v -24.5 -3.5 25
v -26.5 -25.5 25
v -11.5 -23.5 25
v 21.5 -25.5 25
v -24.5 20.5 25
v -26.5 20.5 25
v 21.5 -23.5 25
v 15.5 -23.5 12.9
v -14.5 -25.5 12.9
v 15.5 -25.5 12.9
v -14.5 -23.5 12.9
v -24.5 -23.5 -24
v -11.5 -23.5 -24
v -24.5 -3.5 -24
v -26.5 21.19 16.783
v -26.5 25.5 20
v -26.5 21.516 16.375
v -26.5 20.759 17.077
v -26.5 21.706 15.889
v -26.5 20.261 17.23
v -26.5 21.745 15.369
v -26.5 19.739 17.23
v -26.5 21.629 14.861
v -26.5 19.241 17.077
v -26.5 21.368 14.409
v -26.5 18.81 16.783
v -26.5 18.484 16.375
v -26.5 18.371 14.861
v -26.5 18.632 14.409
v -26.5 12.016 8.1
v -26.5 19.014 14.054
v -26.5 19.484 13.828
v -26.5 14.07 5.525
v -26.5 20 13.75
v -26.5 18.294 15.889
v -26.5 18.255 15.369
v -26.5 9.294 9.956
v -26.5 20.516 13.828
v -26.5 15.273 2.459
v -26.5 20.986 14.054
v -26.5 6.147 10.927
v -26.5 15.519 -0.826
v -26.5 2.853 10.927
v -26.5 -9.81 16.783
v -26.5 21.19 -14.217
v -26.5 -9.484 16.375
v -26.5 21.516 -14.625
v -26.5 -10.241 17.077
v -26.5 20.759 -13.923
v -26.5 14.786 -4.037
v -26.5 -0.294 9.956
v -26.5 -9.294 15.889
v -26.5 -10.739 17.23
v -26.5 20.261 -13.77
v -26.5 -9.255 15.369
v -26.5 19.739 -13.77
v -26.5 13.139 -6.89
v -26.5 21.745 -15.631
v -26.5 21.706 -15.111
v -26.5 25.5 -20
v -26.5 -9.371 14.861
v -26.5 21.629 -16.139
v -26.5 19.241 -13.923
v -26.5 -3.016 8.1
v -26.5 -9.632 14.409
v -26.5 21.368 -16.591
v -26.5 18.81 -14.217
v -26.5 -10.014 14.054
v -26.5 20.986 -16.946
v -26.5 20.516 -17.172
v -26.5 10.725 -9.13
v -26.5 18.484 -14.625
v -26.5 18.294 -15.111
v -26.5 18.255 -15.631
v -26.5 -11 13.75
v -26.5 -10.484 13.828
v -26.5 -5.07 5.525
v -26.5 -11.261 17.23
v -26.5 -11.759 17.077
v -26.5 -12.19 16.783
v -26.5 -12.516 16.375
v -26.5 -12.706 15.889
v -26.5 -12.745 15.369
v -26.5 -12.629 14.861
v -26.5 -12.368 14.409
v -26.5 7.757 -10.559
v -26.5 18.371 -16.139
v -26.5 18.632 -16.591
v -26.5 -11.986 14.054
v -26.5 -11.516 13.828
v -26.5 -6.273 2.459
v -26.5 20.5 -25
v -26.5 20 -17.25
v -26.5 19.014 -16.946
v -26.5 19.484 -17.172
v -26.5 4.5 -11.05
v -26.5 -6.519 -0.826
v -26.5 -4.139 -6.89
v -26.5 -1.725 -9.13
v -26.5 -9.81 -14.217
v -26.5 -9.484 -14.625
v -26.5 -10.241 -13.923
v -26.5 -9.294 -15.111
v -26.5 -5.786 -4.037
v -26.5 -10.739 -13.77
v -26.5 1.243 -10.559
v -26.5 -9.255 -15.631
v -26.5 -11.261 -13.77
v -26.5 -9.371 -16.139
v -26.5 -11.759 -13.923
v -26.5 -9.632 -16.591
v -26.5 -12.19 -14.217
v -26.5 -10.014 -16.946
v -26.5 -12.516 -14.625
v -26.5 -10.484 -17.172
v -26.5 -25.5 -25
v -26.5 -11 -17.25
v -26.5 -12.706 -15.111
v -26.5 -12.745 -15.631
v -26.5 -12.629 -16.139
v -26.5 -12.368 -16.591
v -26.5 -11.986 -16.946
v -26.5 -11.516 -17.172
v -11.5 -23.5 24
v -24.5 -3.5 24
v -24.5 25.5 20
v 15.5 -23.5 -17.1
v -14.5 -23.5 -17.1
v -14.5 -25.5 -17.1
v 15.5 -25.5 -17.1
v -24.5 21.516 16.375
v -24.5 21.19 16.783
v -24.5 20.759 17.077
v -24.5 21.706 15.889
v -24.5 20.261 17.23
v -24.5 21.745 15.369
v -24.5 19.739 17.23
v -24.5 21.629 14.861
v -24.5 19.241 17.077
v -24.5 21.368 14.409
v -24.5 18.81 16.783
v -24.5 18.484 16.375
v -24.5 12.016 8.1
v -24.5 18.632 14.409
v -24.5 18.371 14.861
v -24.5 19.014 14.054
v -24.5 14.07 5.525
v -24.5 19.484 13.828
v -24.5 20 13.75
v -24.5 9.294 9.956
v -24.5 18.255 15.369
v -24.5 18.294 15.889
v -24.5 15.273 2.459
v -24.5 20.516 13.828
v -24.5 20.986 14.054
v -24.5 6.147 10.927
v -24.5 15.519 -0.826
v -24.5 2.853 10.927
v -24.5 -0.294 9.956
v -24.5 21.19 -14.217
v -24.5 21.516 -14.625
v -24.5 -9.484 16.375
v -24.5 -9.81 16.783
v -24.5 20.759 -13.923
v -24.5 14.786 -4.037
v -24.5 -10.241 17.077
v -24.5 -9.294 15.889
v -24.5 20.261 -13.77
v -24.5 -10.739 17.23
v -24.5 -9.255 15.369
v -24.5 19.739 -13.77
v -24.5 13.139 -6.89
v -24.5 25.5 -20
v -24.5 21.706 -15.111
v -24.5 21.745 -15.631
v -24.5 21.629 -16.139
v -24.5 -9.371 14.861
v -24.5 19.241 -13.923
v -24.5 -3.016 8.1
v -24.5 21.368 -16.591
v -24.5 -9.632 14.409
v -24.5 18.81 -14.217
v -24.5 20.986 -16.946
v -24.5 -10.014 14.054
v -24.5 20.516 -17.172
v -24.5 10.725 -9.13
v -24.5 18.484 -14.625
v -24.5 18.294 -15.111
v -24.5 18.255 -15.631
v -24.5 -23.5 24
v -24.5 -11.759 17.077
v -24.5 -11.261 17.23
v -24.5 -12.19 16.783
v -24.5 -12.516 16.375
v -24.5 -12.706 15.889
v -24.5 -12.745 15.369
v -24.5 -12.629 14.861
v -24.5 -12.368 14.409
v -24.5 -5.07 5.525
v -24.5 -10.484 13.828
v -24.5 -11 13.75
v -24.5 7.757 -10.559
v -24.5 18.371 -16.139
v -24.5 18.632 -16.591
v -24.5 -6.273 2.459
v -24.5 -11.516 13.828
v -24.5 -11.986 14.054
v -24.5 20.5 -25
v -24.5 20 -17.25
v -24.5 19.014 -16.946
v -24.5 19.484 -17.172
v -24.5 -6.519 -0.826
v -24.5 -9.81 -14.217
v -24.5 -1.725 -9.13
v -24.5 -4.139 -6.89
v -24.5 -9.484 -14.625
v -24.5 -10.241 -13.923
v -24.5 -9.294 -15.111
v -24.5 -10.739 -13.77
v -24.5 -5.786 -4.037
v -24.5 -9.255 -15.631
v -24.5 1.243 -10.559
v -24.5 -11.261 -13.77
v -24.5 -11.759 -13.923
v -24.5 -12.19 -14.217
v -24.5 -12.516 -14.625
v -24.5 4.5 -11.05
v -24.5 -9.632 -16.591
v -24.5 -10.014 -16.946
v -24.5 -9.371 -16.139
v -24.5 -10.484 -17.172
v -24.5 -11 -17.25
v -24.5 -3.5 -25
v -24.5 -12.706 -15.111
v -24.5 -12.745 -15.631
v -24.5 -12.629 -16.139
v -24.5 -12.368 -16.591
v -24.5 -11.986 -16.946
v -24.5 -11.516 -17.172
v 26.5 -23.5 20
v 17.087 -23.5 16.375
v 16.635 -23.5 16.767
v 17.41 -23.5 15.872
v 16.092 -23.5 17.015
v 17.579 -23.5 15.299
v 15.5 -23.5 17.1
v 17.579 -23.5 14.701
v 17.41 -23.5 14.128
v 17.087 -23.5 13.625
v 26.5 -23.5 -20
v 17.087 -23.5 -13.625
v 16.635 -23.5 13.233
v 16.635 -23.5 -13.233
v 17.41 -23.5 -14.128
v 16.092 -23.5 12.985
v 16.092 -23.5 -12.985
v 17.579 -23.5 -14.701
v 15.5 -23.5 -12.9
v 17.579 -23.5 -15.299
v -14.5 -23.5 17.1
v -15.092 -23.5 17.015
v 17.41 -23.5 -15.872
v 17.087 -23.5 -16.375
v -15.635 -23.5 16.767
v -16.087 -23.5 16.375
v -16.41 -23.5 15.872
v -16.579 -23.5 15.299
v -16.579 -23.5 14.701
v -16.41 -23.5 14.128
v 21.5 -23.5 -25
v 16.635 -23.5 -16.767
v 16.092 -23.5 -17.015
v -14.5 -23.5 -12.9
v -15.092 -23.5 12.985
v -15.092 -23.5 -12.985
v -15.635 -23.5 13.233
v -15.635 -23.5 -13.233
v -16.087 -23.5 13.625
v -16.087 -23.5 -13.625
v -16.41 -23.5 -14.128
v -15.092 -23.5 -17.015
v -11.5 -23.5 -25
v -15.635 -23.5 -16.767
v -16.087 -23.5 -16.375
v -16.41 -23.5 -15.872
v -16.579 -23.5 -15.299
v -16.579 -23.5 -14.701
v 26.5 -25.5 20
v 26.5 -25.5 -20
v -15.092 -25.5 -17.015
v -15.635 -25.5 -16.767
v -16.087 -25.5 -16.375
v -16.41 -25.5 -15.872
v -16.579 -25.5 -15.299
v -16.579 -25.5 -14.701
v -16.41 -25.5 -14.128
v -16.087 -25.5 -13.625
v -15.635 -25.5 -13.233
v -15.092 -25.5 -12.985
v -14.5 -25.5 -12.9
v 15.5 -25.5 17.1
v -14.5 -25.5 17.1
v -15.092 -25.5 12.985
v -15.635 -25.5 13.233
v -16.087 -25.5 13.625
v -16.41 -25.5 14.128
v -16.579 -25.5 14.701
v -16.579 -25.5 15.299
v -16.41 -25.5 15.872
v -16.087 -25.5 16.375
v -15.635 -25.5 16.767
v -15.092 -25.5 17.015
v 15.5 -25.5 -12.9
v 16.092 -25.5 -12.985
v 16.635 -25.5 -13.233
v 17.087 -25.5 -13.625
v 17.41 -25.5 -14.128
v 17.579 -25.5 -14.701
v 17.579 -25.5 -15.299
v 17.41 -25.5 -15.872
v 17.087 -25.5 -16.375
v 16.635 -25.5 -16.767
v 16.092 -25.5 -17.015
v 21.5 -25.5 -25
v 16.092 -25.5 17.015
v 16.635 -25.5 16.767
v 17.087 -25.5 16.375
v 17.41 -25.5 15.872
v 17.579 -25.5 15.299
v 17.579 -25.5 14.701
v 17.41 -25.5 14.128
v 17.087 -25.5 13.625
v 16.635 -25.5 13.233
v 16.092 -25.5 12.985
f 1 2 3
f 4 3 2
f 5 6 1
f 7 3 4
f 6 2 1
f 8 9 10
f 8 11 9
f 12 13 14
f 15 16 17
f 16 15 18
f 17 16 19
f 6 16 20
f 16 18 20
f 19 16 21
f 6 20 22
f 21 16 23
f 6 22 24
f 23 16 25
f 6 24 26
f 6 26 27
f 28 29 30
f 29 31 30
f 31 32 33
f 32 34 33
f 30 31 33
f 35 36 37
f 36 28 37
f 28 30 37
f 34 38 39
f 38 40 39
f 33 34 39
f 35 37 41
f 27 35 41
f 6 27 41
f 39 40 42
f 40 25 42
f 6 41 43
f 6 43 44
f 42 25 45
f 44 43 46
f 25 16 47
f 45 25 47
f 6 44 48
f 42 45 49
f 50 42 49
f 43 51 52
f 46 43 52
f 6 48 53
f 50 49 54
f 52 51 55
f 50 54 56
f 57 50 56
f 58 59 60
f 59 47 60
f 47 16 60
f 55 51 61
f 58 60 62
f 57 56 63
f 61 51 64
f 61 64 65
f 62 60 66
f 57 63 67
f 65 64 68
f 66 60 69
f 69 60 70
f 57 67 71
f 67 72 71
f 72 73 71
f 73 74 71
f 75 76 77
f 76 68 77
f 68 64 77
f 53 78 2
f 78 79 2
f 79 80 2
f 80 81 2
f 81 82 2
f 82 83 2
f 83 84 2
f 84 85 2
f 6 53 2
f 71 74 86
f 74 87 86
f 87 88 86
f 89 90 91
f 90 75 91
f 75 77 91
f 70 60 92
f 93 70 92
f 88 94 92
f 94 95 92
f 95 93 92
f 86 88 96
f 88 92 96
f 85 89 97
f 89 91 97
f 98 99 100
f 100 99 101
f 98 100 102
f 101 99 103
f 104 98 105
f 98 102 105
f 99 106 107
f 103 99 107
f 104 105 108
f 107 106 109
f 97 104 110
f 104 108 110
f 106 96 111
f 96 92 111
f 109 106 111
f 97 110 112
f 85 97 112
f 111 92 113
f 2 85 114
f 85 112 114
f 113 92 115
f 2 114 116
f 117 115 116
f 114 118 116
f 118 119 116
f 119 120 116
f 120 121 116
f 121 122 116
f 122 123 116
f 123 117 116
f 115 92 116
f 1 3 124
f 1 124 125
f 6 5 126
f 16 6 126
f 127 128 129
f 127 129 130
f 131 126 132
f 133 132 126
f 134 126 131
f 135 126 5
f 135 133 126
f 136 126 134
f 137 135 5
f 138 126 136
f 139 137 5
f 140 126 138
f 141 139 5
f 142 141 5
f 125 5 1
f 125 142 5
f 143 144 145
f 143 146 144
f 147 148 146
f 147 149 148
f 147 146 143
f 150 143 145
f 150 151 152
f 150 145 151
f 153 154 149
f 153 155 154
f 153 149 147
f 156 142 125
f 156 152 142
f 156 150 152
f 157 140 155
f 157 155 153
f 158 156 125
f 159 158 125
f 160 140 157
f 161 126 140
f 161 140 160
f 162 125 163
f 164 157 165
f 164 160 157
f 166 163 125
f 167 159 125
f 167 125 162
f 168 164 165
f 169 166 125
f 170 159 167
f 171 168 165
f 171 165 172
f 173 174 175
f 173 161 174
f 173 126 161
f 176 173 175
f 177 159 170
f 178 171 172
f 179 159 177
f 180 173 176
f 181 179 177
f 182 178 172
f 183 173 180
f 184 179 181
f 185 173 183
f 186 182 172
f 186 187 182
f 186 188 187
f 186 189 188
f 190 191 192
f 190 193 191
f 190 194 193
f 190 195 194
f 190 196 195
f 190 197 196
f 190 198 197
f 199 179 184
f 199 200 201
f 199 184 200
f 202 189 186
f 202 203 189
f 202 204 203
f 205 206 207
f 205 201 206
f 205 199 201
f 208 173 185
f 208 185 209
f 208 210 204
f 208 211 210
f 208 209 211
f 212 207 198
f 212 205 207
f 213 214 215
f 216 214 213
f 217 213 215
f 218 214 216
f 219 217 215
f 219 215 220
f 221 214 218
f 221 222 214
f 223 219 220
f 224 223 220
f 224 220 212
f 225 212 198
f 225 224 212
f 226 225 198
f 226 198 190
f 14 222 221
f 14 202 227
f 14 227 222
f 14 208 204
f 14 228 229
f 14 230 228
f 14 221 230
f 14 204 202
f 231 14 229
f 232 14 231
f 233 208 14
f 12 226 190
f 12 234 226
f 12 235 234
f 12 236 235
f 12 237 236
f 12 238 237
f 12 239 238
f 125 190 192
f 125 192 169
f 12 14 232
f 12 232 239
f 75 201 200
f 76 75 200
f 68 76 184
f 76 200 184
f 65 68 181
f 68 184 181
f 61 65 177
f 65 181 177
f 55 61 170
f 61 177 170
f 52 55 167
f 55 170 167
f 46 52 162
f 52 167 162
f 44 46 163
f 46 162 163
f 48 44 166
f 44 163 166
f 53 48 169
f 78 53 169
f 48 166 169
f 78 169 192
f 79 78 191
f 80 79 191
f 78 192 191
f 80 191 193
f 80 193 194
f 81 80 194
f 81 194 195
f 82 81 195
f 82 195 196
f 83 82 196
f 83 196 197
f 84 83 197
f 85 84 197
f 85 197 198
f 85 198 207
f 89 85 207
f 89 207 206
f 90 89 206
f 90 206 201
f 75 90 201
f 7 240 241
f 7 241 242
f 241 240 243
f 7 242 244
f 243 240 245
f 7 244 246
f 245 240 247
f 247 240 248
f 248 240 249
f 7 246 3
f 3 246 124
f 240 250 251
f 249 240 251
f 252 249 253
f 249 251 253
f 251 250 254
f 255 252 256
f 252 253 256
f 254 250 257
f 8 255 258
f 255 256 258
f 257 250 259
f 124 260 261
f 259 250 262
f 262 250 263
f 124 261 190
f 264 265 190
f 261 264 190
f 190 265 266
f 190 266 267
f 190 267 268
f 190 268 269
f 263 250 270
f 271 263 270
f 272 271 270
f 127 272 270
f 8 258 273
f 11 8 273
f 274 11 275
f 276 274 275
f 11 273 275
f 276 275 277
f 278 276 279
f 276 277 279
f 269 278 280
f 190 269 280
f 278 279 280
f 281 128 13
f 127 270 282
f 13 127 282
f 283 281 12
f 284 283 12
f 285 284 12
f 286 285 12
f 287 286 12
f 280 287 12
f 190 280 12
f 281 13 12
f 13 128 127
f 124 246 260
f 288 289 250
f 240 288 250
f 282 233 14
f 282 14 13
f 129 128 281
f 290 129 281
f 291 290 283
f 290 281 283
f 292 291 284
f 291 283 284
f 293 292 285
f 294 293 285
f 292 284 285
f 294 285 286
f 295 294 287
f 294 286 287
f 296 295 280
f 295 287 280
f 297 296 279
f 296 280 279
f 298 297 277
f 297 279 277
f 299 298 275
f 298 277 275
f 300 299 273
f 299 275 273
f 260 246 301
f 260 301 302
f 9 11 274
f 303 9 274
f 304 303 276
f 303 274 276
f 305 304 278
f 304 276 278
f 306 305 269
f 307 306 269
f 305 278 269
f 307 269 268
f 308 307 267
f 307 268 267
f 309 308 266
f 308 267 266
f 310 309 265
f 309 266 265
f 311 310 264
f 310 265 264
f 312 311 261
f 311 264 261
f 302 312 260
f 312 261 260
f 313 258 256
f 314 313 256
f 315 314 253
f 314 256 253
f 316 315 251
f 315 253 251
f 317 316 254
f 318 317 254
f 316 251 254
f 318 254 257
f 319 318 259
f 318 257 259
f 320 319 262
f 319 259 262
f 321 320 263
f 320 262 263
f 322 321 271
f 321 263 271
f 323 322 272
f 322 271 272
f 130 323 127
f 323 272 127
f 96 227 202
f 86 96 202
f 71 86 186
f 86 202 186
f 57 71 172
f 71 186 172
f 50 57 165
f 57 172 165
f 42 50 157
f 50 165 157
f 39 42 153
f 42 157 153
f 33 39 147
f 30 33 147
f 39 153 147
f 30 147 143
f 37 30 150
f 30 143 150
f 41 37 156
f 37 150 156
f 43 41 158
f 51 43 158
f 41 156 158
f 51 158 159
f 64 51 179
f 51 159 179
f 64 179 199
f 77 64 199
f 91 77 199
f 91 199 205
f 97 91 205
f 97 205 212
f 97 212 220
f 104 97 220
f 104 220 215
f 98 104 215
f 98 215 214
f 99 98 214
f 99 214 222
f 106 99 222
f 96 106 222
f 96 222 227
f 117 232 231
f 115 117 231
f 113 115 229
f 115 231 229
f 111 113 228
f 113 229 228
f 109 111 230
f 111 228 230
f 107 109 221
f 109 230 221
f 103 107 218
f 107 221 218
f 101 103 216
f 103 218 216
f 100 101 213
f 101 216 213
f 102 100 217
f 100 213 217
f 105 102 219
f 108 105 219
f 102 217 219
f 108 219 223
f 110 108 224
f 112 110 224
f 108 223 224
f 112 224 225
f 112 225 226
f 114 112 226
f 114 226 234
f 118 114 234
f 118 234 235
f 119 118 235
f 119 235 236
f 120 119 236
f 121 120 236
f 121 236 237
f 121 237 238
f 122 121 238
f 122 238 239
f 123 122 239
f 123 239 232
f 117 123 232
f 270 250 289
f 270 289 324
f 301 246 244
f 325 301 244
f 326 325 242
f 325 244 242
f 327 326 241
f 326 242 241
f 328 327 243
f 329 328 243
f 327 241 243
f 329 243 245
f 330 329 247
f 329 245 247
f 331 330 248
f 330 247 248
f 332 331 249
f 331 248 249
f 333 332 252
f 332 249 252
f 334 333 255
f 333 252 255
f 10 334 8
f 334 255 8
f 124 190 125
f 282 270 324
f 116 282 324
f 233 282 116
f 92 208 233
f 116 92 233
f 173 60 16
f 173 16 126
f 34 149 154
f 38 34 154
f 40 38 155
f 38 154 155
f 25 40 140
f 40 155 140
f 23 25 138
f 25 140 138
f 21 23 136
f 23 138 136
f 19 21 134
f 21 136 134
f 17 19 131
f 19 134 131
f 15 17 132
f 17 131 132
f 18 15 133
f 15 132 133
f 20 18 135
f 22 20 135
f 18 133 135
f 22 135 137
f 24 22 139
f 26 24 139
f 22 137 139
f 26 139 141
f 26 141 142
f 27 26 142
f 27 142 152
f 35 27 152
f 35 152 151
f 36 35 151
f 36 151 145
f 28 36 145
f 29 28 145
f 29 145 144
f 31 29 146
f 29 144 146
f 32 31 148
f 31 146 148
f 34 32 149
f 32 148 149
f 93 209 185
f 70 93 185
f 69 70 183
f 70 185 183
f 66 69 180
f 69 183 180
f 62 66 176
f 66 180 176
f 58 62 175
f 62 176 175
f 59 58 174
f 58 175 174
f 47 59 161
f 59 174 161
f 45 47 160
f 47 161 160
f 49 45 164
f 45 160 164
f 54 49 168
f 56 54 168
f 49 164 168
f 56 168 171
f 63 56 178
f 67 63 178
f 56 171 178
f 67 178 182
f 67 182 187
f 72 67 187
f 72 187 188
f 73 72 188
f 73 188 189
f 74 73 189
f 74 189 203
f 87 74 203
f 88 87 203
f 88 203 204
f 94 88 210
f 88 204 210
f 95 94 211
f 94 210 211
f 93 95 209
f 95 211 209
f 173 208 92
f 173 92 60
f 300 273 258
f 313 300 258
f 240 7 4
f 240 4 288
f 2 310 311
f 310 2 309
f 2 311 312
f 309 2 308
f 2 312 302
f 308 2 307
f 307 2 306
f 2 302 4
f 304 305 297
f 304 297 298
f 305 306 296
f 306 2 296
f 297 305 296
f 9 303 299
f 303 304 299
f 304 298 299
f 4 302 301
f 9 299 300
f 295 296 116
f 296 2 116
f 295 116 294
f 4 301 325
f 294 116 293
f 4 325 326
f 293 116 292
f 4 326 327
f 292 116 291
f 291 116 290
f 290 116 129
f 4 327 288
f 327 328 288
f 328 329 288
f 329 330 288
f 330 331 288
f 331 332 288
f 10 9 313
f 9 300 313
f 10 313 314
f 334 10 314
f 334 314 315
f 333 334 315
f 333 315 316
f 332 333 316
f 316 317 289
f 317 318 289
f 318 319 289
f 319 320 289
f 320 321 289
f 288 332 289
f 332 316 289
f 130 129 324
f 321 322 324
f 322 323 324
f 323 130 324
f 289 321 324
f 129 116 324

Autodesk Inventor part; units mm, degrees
ref_plane "YZ Plane" through (0, 0, 0) normal (1, 0, 0) x (0, 1, 0)
ref_plane "XZ Plane" through (0, 0, 0) normal (0, 1, 0) x (-1, 0, 0)
ref_plane "XY Plane" through (0, 0, 0) normal (0, 0, 1) x (1, 0, 0)
sketch "Sketch1" plane through (0, 0, 0) normal (0, 0, 1) x (1, 0, 0)
  line L0 (-26.5, 25.5) -> (-24.5, 25.5)
  line L1 (-24.5, 25.5) -> (-24.5, -23.5)
  line L2 (-26.5, -25.5) -> (26.5, -25.5)
  line L3 (26.5, -25.5) -> (26.5, -23.5)
  line L4 (26.5, -23.5) -> (-24.5, -23.5)
  line L5 (-26.5, 25.5) -> (-26.5, -25.5)
  point P0 (0, 0)
  point P1 (-26.5, 0)
  point P2 (0, -25.5)
  dimension "d1" = 51
  dimension "d2" = 2
  dimension "d4" = 2
  dimension "d5" = 53
extrude "Extrusion1" add sketch "Sketch1" along normal mid plane 50
sketch "Sketch2" plane through (-24.5, -23.5, 25) normal (1, 0, 0) x (0, 0, -1)
  circle A0 centre (25, 28) radius 11.05
  circle A1 centre (9.5, 43.5) radius 1.75
  circle A2 centre (40.5, 43.5) radius 1.75
  circle A3 centre (9.5, 12.5) radius 1.75
  circle A4 centre (40.5, 12.5) radius 1.75
  line L0 (0, 49) -> (50, 49) projected
  line L1 (9.5, 43.5) -> (40.5, 43.5) construction
  line L2 (9.5, 43.5) -> (9.5, 12.5) construction
  point P0 (25, 23.5)
  point P1 (25, 43.5)
  point P2 (9.5, 28)
  dimension "d8" = 22.1
  dimension "d9" = 3.5
  dimension "d10" = 31
  dimension "d11" = 31
  dimension "d12" = 21
extrude "Extrusion2" cut sketch "Sketch2" against normal up to next
sketch "Sketch3" plane through (-24.5, -23.5, 25) normal (1, 0, 0) x (0, 0, -1)
  line L0 (0, 44) -> (5, 49)
  line L1 (50, 49) -> (0, 49) projected
  line L2 (25, 22.7162) -> (25, 49) construction
  line L3 (50, 44) -> (45, 49)
  line L4 (0, 0) -> (0, 49) projected
  line L5 (50, 49) -> (50, 0) projected
  line L6 (0, 49) -> (50, 49) projected
  line L7 (45, 49) -> (50, 49)
  line L8 (50, 49) -> (50, 44)
  line L9 (5, 49) -> (0, 49)
  line L10 (0, 44) -> (0, 49)
  point P0 (25, 23.5)
  dimension "d15" = 45
  dimension "d16" = 5
extrude "Extrusion3" cut sketch "Sketch3" against normal up to next
sketch "Sketch4" plane through (-24.5, -23.5, 25) normal (0, 1, 0) x (1, 0, 0)
  arc A0 (10, 12.1) -> (10, 7.9) centre (10, 10) ccw
  arc A1 (10, 42.1) -> (10, 37.9) centre (10, 40) ccw
  arc A2 (40, 7.9) -> (40, 12.1) centre (40, 10) ccw
  arc A3 (40, 37.9) -> (40, 42.1) centre (40, 40) ccw
  line L0 (40, 7.9) -> (10, 7.9)
  line L1 (10, 12.1) -> (40, 12.1)
  line L2 (10, 37.9) -> (40, 37.9)
  line L3 (10, 42.1) -> (40, 42.1)
  line L4 (10, 10) -> (10, 40) construction
  line L5 (51, 50) -> (51, 0) projected
  point P0 (24.5, 25)
  point P1 (10, 25)
  dimension "d19" = 4.2
  dimension "d20" = 30
  dimension "d21" = 30
  dimension "d22" = 4.2
  dimension "d23" = 11
extrude "Extrusion4" cut sketch "Sketch4" against normal up to next
sketch "Sketch5" plane through (-24.5, -23.5, 25) normal (0, 1, 0) x (1, 0, 0)
  line L0 (10, 12.1) -> (40, 12.1) projected
  arc A0 (40, 7.9) -> (40, 12.1) centre (40, 10) ccw projected
  line L1 (40, 7.9) -> (10, 7.9) projected
  arc A1 (10, 12.1) -> (10, 7.9) centre (10, 10) ccw projected
  line L2 (40, 37.9) -> (10, 37.9) projected
  arc A2 (10, 42.1) -> (10, 37.9) centre (10, 40) ccw projected
  line L3 (10, 42.1) -> (40, 42.1) projected
  arc A3 (40, 37.9) -> (40, 42.1) centre (40, 40) ccw projected
  line L4 (0, 50) -> (0, 0) projected
  line L5 (51, 0) -> (0, 0) projected
  line L6 (51, 50) -> (51, 0) projected
  line L7 (0, 50) -> (51, 50) projected
  line L8 (46, 0) -> (51, 5)
  line L9 (51, 45) -> (46, 50)
  line L10 (51, 50) -> (-2, 50) projected
  point P0 (24.5, 25)
  dimension "d26" = 5
  dimension "d27" = 5
extrude "Extrusion5" cut sketch "Sketch5" against normal up to next contours L7 L6 L9 | L8 L6 L5
sketch "Sketch6" plane through (0, 0, 25) normal (0, 0, 1) x (1, 0, 0)
  line L0 (-11.5, -23.5) -> (-24.5, -3.5)
  line L1 (-11.5, -23.5) -> (-24.5, -23.5)
  line L2 (-24.5, -23.5) -> (-24.5, -3.5)
  point P0 (0, 0)
  dimension "d30" = 13
  dimension "d31" = 20
extrude "Extrusion6" add sketch "Sketch6" against normal blind 1
mirror "Mirror1" about plane through (0, 0, 0) normal (0, 0, 1) of "Extrusion6"
equation "\"d22\" = d19"
properties part number "mount-extruder"
